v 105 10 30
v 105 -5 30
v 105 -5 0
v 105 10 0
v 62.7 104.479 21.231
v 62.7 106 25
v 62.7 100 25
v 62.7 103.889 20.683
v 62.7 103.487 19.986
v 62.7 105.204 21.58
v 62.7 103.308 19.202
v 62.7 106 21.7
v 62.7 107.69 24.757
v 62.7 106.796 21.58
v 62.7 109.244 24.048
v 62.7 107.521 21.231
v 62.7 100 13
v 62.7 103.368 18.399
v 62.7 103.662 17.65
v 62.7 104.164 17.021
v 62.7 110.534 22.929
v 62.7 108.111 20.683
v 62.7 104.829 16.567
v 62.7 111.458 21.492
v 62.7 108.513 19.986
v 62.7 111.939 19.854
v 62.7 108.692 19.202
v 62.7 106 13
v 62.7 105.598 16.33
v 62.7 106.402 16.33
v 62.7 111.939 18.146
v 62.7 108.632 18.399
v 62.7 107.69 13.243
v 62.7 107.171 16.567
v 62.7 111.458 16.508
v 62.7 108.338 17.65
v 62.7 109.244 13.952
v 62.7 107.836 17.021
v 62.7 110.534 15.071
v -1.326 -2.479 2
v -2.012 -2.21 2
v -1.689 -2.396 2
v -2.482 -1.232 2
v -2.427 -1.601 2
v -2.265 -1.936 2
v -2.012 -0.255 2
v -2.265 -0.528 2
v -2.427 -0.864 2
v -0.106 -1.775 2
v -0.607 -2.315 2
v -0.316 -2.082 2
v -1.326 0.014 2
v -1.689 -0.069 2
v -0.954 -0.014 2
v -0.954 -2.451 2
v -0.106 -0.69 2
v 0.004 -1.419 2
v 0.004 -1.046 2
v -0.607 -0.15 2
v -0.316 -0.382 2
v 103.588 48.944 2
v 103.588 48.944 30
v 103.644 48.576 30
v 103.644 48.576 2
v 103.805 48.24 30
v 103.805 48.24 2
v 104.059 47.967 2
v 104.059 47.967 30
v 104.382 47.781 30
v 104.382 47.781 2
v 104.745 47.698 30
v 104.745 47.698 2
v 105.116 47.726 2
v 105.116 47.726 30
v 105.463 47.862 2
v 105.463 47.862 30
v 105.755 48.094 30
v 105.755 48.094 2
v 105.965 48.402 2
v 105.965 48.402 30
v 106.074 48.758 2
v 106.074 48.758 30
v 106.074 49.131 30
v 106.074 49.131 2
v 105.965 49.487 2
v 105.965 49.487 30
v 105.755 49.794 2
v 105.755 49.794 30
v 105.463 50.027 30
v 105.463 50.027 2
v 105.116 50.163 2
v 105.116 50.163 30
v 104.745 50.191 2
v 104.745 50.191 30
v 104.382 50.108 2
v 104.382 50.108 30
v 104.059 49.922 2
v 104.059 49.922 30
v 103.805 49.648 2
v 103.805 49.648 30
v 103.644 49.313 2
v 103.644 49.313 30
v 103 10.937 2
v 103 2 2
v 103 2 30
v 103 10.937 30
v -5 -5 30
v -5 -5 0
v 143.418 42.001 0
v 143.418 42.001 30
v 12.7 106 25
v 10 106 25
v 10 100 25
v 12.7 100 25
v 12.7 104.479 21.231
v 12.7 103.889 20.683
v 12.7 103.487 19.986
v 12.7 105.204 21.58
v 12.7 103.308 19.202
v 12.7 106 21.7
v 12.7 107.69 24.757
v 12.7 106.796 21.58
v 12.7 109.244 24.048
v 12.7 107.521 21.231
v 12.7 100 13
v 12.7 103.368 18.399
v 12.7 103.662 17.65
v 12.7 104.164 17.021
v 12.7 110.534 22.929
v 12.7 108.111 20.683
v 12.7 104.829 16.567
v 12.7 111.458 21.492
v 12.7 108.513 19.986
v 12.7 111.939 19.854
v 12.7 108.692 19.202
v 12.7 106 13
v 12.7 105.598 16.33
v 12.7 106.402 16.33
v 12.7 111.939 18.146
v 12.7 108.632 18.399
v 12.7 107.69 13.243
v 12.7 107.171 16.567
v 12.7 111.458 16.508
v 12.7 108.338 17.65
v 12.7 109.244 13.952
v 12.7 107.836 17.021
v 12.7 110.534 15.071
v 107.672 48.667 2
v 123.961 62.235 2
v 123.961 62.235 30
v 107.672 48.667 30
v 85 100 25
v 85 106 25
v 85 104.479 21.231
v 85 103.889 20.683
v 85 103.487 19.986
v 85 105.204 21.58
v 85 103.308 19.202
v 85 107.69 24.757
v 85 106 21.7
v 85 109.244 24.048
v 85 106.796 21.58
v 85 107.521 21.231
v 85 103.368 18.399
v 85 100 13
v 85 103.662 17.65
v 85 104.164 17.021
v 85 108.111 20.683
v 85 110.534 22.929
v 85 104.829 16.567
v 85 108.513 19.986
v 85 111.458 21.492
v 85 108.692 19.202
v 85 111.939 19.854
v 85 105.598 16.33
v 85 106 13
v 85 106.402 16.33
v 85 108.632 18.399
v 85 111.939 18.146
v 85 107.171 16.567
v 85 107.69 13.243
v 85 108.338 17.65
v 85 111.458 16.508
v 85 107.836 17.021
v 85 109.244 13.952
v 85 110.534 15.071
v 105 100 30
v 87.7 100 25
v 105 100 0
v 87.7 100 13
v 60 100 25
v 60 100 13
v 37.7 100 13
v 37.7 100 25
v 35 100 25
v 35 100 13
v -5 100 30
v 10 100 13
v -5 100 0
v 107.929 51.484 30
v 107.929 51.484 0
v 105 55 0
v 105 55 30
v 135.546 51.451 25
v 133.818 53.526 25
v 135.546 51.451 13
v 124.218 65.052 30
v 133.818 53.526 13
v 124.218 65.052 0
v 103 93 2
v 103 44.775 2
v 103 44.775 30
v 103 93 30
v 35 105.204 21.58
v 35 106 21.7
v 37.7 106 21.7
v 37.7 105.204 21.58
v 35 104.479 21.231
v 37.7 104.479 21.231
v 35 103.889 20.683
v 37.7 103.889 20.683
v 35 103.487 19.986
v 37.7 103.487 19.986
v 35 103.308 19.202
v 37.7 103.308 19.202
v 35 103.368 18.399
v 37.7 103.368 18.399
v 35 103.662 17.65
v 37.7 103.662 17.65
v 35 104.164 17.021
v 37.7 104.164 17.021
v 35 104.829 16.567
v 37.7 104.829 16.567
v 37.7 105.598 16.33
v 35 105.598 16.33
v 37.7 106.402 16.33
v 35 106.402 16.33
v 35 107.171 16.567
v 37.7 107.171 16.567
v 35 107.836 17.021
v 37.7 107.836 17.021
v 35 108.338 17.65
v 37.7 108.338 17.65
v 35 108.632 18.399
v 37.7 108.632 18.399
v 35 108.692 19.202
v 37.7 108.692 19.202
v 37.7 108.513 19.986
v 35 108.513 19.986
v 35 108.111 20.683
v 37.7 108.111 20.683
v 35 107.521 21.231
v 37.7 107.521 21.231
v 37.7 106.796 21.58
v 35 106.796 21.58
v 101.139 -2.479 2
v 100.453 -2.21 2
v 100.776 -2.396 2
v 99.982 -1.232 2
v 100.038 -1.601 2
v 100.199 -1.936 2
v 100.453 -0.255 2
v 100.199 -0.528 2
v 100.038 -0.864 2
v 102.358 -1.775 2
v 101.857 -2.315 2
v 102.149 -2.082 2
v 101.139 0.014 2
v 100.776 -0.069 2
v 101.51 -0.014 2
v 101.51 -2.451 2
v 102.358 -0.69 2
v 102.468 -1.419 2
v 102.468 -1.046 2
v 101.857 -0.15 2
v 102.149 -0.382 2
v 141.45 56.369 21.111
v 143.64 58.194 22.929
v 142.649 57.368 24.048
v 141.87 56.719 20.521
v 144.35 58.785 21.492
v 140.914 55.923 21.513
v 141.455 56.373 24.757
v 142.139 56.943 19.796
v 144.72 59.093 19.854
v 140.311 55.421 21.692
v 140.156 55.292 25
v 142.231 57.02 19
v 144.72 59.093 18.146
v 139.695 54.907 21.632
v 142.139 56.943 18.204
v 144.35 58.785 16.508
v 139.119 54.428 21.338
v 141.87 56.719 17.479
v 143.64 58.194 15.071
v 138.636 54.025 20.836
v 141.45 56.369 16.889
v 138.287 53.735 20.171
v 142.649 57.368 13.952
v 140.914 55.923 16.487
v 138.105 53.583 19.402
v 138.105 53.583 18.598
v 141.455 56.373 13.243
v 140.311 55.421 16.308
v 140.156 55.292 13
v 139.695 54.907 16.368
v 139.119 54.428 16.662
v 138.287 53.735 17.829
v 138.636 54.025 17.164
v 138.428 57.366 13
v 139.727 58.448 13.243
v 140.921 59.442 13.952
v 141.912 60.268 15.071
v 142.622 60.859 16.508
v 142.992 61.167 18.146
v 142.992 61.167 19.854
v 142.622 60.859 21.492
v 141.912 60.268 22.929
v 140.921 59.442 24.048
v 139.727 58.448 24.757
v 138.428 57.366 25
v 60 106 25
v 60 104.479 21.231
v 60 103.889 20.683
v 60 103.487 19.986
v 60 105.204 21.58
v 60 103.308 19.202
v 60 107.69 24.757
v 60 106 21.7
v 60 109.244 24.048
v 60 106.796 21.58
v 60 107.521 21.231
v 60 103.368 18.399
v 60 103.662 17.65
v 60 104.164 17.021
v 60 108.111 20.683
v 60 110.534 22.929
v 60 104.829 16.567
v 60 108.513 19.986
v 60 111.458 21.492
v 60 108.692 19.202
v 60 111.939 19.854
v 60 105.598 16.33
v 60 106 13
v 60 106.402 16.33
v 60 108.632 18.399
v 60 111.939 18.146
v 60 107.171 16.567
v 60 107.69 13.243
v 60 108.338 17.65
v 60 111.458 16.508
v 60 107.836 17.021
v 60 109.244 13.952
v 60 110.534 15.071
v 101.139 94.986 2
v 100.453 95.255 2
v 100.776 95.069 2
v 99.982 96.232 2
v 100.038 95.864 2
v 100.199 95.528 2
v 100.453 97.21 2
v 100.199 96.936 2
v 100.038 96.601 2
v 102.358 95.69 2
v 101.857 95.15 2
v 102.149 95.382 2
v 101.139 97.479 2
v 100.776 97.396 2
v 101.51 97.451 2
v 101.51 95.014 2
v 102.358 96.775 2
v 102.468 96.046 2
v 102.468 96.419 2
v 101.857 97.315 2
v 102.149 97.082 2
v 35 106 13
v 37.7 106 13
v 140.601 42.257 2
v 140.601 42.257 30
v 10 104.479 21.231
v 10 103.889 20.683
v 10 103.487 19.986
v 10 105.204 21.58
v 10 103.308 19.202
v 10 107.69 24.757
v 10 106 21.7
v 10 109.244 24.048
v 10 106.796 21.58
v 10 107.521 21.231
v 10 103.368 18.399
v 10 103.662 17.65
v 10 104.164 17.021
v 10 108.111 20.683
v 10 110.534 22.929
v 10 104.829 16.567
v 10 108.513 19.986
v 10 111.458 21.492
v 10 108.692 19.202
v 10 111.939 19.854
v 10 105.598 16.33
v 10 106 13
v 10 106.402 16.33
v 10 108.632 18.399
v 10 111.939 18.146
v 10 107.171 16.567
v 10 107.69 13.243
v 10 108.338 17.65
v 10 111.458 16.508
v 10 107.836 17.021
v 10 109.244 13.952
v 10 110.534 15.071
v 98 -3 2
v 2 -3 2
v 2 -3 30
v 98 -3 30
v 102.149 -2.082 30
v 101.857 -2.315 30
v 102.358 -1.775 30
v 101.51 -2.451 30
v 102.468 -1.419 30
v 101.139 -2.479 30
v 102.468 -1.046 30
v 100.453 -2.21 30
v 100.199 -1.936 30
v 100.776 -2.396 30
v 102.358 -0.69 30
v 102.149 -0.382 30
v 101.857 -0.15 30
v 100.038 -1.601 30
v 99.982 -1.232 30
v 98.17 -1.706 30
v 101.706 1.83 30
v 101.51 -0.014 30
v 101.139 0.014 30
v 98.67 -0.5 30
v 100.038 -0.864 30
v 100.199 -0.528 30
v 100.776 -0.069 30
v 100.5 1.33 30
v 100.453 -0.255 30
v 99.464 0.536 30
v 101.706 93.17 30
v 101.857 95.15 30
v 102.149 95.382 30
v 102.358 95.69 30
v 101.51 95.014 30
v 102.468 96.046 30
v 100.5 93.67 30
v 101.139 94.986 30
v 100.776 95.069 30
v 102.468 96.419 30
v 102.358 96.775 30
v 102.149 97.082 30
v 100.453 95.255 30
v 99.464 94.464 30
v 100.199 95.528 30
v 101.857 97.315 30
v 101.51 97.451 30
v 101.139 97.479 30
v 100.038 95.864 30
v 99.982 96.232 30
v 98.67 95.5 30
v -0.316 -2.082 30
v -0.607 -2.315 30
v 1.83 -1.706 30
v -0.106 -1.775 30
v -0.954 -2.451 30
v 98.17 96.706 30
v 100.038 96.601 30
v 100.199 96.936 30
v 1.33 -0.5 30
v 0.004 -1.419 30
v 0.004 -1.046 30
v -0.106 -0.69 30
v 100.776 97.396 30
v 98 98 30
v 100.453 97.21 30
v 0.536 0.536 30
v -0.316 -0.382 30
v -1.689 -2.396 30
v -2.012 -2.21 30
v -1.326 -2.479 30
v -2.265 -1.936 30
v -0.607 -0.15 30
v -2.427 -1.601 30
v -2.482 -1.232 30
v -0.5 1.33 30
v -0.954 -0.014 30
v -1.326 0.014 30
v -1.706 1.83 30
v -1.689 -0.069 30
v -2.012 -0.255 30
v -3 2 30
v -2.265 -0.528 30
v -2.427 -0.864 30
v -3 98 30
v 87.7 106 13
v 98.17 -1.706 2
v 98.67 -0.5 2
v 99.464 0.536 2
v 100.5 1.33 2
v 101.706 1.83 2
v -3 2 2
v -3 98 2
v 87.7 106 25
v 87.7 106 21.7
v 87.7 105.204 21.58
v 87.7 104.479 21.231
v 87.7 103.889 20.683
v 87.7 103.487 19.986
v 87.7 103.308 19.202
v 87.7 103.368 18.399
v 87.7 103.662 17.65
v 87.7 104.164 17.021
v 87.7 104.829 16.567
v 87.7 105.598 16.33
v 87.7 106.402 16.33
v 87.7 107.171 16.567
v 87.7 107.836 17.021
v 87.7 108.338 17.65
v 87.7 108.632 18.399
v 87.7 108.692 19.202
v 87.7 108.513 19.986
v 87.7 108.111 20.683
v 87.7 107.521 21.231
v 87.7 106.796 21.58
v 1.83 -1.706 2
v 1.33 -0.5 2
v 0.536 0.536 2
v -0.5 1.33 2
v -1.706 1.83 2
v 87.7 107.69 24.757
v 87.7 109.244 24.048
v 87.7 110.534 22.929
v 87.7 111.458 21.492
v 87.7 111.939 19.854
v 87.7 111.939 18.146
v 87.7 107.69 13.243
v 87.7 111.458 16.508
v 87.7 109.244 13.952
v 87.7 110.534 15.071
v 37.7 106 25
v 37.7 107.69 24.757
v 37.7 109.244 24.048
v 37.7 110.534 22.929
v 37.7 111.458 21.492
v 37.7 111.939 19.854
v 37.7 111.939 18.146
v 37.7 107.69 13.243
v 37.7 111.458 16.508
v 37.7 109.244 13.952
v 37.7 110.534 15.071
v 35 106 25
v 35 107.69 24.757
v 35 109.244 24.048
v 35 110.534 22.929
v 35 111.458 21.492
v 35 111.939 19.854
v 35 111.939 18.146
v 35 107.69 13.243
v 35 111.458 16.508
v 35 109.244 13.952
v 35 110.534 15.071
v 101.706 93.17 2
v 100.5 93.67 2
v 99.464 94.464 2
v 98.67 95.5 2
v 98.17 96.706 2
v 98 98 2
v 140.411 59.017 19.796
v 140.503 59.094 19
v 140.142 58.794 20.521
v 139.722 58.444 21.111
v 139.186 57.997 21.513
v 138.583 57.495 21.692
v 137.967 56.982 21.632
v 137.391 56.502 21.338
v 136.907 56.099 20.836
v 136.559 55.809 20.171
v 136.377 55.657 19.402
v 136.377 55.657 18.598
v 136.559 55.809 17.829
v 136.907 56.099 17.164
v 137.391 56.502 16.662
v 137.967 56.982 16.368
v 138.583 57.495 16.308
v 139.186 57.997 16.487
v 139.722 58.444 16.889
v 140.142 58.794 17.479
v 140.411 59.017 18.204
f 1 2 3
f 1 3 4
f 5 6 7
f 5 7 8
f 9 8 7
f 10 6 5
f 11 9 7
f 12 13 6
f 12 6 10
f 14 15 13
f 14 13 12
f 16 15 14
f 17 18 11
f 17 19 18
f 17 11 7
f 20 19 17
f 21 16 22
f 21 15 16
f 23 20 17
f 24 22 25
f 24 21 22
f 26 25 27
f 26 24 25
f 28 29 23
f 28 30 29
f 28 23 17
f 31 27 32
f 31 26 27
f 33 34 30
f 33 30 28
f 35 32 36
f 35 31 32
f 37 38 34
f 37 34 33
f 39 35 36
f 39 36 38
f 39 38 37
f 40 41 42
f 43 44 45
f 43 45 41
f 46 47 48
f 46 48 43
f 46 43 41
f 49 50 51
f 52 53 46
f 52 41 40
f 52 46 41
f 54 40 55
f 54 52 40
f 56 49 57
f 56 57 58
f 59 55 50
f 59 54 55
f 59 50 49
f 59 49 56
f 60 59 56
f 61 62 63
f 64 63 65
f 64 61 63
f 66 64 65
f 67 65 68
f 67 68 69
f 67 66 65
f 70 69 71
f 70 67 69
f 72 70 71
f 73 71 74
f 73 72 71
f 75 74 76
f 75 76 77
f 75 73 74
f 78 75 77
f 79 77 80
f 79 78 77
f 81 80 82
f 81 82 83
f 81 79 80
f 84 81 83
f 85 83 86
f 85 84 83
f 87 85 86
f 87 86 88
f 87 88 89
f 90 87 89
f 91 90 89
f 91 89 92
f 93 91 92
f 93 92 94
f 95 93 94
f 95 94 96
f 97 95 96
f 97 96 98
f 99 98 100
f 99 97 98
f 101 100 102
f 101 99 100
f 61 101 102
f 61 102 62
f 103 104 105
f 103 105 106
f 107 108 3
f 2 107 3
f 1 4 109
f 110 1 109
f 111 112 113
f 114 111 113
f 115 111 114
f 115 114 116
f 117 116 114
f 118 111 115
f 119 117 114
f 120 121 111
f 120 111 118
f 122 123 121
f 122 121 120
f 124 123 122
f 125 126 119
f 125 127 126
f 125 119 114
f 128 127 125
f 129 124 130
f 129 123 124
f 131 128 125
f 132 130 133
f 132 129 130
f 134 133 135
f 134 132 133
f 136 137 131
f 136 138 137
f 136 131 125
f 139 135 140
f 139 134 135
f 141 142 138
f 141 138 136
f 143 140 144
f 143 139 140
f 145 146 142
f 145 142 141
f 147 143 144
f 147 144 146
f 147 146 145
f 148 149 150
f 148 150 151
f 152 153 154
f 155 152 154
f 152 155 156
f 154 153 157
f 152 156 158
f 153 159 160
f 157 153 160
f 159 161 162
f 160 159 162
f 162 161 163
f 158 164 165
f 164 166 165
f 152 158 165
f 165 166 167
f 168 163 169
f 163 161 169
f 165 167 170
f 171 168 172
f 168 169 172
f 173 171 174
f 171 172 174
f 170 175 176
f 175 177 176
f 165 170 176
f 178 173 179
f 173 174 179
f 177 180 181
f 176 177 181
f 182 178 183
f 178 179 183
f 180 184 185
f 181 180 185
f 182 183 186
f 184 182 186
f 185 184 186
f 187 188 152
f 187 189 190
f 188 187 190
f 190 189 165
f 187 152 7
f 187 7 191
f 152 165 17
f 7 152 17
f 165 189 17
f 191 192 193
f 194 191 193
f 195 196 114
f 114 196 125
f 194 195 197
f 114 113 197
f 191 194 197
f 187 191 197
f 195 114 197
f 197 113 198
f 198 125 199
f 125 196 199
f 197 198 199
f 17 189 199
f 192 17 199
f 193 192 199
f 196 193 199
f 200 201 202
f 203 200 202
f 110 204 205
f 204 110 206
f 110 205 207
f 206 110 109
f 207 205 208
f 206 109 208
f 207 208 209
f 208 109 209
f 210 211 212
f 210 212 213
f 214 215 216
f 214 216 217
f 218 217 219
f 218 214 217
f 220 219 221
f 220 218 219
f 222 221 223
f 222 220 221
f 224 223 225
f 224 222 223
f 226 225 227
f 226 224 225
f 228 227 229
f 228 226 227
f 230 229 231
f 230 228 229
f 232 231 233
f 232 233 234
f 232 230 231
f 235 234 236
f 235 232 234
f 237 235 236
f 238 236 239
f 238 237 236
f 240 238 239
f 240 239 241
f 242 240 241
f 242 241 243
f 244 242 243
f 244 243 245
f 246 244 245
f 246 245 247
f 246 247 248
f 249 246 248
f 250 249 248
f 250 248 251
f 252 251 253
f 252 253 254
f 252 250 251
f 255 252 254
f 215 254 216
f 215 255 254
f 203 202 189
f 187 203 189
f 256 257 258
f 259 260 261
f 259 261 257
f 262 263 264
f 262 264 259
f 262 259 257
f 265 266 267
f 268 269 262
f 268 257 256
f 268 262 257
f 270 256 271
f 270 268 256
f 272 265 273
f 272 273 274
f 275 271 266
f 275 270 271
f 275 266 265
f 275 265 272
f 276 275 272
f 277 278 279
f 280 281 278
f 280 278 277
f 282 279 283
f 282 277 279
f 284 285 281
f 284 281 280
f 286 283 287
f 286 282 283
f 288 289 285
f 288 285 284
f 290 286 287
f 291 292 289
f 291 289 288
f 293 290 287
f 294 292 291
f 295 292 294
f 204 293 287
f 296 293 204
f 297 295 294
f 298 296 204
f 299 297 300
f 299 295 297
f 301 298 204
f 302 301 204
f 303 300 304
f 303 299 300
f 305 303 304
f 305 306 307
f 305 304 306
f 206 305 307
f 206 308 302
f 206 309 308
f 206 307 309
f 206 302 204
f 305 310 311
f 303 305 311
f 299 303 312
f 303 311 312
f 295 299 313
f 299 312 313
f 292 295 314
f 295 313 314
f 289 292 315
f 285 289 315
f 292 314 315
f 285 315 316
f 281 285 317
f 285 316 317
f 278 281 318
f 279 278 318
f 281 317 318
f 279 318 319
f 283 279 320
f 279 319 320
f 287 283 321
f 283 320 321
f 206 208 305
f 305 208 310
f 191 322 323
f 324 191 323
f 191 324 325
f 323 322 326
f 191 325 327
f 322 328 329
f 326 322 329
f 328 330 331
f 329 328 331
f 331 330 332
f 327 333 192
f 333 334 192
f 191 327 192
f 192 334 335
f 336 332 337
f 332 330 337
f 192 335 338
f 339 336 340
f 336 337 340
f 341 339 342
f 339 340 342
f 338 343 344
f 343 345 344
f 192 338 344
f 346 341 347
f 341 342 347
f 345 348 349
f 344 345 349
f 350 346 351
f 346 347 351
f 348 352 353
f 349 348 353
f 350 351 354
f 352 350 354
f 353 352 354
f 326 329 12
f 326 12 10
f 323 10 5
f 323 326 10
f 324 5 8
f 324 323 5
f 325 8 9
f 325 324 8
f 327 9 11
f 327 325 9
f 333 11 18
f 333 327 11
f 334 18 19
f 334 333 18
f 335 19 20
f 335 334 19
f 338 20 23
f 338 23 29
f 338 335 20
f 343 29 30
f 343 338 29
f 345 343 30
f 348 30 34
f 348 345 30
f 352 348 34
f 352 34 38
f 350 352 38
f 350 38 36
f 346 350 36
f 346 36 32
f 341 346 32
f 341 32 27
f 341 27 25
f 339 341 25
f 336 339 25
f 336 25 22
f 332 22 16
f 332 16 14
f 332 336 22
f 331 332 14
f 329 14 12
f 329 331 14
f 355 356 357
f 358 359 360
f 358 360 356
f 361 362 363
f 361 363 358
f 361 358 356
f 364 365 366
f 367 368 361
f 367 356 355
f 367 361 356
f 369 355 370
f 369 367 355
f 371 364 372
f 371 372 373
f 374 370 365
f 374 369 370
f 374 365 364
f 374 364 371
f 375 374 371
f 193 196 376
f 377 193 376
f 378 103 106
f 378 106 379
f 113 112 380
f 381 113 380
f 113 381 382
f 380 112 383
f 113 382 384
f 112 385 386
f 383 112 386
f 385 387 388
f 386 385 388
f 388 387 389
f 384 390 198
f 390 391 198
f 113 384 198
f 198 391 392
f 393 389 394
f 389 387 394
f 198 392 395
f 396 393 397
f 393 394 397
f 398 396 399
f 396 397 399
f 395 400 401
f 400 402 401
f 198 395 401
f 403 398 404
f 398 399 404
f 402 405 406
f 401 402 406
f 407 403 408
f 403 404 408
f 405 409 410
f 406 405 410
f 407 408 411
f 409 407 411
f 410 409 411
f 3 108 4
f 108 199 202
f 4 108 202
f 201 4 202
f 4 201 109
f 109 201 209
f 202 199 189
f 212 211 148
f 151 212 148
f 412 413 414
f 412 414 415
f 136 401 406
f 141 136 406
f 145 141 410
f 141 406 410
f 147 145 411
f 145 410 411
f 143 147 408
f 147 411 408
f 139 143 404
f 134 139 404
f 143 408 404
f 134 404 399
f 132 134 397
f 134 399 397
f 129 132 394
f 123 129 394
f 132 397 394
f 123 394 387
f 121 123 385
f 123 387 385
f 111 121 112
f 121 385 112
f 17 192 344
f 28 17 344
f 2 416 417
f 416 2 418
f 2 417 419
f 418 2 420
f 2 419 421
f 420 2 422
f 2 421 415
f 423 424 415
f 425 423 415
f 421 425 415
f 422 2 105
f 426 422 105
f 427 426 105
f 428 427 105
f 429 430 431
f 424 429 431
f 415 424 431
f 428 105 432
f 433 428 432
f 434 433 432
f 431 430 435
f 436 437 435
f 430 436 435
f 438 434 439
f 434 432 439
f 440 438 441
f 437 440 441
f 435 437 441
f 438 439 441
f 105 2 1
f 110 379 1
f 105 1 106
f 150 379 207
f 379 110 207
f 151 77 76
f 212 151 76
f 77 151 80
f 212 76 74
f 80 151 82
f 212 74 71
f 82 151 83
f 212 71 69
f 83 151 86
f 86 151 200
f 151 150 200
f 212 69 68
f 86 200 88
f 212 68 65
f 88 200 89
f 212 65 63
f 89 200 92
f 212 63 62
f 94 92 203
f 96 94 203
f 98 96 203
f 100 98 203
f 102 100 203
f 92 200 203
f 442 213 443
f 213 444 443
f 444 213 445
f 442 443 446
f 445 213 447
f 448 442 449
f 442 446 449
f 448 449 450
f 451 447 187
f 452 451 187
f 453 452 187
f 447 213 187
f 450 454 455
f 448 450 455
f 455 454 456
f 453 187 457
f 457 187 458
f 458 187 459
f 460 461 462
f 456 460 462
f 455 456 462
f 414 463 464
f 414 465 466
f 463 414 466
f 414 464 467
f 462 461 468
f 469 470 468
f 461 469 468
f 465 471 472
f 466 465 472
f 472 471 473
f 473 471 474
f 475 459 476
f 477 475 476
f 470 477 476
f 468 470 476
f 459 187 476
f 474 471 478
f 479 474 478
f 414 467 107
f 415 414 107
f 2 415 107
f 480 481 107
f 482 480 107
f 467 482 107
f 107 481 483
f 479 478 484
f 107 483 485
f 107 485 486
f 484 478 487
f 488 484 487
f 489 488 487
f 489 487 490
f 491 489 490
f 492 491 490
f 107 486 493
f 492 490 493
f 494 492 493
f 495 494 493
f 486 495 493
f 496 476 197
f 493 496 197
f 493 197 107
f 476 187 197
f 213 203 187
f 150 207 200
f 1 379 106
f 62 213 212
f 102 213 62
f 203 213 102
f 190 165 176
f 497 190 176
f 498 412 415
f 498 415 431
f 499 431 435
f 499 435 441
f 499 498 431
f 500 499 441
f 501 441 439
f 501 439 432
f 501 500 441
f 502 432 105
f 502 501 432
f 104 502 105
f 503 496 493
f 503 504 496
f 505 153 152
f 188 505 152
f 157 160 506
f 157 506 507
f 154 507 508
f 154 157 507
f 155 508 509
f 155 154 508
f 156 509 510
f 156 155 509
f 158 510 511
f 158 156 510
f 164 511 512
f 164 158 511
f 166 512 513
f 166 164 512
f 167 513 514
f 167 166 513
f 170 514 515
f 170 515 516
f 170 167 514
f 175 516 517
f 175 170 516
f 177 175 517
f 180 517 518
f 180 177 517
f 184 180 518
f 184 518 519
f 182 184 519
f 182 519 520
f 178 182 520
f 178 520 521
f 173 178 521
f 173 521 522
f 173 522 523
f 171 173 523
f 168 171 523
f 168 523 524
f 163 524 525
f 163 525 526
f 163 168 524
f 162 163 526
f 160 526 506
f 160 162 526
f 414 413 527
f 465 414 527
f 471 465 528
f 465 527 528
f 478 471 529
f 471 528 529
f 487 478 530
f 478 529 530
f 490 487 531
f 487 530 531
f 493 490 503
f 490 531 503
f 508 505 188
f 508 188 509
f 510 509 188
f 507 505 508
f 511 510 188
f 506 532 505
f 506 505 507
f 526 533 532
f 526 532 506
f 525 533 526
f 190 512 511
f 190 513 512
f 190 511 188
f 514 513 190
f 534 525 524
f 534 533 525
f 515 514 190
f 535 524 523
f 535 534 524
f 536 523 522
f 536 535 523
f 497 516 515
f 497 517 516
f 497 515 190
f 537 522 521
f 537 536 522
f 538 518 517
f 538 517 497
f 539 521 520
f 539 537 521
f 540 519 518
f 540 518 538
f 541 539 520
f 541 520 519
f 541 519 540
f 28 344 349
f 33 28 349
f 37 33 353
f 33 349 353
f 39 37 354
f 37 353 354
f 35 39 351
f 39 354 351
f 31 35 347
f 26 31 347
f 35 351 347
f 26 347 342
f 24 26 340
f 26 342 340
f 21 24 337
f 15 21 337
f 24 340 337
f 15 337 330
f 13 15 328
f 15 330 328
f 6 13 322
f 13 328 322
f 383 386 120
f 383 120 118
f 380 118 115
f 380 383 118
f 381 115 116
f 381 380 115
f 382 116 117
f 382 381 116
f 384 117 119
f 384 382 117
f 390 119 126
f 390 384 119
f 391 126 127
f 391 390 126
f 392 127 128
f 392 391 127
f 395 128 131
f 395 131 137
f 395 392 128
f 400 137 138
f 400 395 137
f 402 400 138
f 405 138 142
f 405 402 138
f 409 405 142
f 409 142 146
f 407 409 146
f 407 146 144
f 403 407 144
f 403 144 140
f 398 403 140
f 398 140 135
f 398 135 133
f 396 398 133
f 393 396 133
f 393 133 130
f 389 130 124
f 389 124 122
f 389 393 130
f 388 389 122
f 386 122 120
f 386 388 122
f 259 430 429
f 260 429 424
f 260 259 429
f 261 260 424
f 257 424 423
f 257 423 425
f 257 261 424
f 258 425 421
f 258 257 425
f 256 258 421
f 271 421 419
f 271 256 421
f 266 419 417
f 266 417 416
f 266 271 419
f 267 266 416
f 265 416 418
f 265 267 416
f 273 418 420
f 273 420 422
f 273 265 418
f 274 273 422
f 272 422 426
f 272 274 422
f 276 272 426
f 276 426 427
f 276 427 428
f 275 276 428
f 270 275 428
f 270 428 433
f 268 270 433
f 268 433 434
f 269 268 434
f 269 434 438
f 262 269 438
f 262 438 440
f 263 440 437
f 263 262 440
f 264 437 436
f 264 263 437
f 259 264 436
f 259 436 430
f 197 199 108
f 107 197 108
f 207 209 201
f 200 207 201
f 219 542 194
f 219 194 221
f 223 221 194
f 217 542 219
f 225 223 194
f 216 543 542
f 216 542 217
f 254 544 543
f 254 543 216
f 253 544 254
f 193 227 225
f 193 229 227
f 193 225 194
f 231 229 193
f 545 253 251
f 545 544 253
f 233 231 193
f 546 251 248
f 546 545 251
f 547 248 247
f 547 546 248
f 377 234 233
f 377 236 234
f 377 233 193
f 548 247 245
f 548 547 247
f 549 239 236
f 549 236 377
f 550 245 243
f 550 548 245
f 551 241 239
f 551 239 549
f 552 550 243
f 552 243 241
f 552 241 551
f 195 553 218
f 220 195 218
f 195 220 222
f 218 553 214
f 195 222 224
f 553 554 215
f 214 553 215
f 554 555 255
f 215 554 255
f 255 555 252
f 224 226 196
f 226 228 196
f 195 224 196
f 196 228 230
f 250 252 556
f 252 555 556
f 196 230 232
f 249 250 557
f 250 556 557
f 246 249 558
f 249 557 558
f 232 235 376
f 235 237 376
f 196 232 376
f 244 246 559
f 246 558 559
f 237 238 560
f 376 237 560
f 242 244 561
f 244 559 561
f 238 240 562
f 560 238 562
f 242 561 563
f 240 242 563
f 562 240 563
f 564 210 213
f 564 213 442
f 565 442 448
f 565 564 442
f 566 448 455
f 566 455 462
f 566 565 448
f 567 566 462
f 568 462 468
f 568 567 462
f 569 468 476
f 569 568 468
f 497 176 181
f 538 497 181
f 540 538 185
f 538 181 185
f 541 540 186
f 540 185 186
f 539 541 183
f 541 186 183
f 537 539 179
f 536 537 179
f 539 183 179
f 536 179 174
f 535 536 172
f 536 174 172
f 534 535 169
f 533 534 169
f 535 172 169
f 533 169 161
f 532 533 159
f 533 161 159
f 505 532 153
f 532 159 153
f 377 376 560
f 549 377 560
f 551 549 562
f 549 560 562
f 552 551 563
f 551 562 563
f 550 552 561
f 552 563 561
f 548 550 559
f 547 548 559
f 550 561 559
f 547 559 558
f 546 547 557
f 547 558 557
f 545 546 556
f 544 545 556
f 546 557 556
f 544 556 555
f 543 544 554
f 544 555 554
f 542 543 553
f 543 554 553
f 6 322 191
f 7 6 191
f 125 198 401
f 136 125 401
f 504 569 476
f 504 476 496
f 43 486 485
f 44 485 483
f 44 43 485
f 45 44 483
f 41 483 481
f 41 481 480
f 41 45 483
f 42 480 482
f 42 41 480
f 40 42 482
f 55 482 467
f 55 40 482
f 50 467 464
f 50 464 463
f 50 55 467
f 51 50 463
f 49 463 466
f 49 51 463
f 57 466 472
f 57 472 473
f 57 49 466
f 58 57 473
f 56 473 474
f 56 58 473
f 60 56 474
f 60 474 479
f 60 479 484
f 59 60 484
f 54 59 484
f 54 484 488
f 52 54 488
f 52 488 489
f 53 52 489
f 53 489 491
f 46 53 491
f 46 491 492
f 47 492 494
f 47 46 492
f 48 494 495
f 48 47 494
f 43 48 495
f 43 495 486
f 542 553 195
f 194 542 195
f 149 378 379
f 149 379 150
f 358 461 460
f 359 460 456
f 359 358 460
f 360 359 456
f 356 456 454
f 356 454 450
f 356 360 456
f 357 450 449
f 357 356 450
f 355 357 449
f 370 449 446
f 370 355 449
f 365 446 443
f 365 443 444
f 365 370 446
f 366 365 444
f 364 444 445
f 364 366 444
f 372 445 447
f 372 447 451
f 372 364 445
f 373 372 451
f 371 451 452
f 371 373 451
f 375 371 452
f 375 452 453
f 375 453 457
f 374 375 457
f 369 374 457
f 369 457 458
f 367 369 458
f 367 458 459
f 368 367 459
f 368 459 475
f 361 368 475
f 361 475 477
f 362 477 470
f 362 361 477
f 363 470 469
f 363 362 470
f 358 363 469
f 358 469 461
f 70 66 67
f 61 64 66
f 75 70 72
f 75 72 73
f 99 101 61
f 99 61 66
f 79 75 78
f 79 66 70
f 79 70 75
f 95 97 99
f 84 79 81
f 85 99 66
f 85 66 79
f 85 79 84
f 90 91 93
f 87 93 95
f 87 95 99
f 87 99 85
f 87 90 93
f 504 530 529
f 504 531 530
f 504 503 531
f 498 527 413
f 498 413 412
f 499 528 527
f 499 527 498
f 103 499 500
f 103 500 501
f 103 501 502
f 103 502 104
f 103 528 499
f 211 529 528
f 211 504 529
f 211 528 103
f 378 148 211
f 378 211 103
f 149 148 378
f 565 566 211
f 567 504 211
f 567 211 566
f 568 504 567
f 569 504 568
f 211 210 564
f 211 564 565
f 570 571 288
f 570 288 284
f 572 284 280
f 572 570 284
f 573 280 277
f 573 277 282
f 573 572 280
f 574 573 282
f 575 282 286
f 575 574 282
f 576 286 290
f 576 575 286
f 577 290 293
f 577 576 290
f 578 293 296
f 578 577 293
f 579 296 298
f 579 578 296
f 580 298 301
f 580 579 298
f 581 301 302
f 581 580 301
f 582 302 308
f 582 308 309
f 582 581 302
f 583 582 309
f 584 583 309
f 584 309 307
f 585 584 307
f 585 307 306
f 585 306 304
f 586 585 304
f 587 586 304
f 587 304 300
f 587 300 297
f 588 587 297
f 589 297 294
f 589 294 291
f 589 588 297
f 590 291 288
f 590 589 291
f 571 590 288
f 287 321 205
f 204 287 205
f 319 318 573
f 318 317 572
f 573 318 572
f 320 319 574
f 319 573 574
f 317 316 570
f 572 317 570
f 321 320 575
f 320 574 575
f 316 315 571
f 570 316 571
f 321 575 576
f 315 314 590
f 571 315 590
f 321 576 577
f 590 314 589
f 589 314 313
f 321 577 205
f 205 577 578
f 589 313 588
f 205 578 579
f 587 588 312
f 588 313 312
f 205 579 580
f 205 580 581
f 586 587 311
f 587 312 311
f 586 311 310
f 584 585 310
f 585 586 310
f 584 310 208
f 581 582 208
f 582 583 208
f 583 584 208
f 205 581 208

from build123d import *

# Parameters (mm, degrees)
BOSS_EXTRUDE1_DEPTH  = 30
SHELL1_T             = -2
BOSS_EXTRUDE8_START  = -28
SKETCH10_R           = 1.25
BOSS_EXTRUDE8_DEPTH  = 28
BOSS_EXTRUDE10_START = 10
SKETCH4_R            = 2.7
BOSS_EXTRUDE10_DEPTH = 2.7
LPATTERN1_COUNT      = 4
LPATTERN1_PITCH      = 25
SKETCH15_R           = 2.7
BOSS_EXTRUDE11_DEPTH = 2.7


with BuildPart() as part:
    # Sketch3 → Boss-Extrude1 (new body)
    with BuildSketch(Plane.XY):
        Polygon((-5, -5), (105, -5), (105, 10), (143.418246447, 42.000599056), (124.217887014, 65.051546924), (107.928964784, 51.483637987), (105, 55), (105, 100), (-5, 100), align=None)
    extrude(amount=BOSS_EXTRUDE1_DEPTH)

    # Shell1
    shell1_openings = [part.faces().sort_by_distance(p)[0] for p in [
        (56.242959197, 46.819948693, 30),
    ]]
    offset(amount=SHELL1_T, openings=shell1_openings, kind=Kind.INTERSECTION)

    # Sketch10 → Boss-Extrude8 (add)
    # profile 1 of 4: a face of its own
    with BuildSketch(Plane.XY.offset(30).offset(BOSS_EXTRUDE8_START)):
        with BuildLine():
            Line((98, 98), (103, 98))
            Line((103, 98), (103, 93))
            ThreePointArc((103, 93), (99.464466094, 94.464466094), (98, 98))
        make_face()
        with Locations(Location((101.232233047, 96.232233047, 0), (0, 0, 180))):
            Circle(SKETCH10_R, mode=Mode.SUBTRACT)
    # profile 2 of 4: a face of its own
    with BuildSketch(Plane.XY.offset(30).offset(BOSS_EXTRUDE8_START)):
        with BuildLine():
            Line((103, 2), (103, -3))
            Line((103, -3), (98, -3))
            ThreePointArc((98, -3), (99.464466094, 0.535533906), (103, 2))
        make_face()
        with Locations(Location((101.232233047, -1.232233047, 0), (0, 0, 180))):
            Circle(SKETCH10_R, mode=Mode.SUBTRACT)
    # profile 3 of 4: a face of its own
    with BuildSketch(Plane.XY.offset(30).offset(BOSS_EXTRUDE8_START)):
        with BuildLine():
            Line((-3, 2), (-3, -3))
            Line((-3, -3), (2, -3))
            ThreePointArc((2, -3), (0.535533906, 0.535533906), (-3, 2))
        make_face()
        with Locations(Location((-1.232233047, -1.232233047, 0), (0, 0, 180))):
            Circle(SKETCH10_R, mode=Mode.SUBTRACT)
    # profile 4 of 4: a face of its own
    with BuildSketch(Plane.XY.offset(30).offset(BOSS_EXTRUDE8_START)):
        Polygon((103, 54.276153954), (103, 44.775111449), (107.672258888, 48.666884167), align=None)
        with Locations(Location((104.838291581, 48.944255676, 0), (0, 0, 180))):
            Circle(SKETCH10_R, mode=Mode.SUBTRACT)
    extrude(amount=BOSS_EXTRUDE8_DEPTH)

    # Sketch4 → Boss-Extrude10 (add)
    with BuildSketch(Plane(origin=(0, 0, 0), x_dir=(0, 0, -1), z_dir=(1, 0, 0)).offset(BOSS_EXTRUDE10_START)):
        with BuildLine():
            Line((-25, 100), (-13, 100))
            Line((-13, 100), (-13, 106))
            ThreePointArc((-13, 106), (-19, 112), (-25, 106))
            Line((-25, 106), (-25, 100))
        make_face()
        with Locations(Location((-19, 106, 0), (0, 0, 180))):
            Circle(SKETCH4_R, mode=Mode.SUBTRACT)
    boss_extrude10 = extrude(amount=BOSS_EXTRUDE10_DEPTH)

    # LPattern1: Boss-Extrude10 ×4
    with Locations(*[(i * LPATTERN1_PITCH, 0, 0) for i in range(1, LPATTERN1_COUNT)]):
        add(boss_extrude10)

    # Sketch15 → Boss-Extrude11 (add)
    with BuildSketch(Plane(origin=(28.491802957, -34.205769267, 0), x_dir=(-0.7683649289406903, -0.6400119811175163, 0), z_dir=(0.6400119811175163, -0.7683649289406903, 0))):
        with BuildLine():
            Line((-137.07843735, -13), (-143.07843735, -13))
            ThreePointArc((-143.07843735, -13), (-149.07843735, -19), (-143.07843735, -25))
            Line((-143.07843735, -25), (-137.07843735, -25))
            Line((-137.07843735, -25), (-137.07843735, -13))
        make_face()
        with Locations(Location((-143.07843735, -19, 0), (0, 0, 180))):
            Circle(SKETCH15_R, mode=Mode.SUBTRACT)
    extrude(amount=BOSS_EXTRUDE11_DEPTH)


solid = part.part
